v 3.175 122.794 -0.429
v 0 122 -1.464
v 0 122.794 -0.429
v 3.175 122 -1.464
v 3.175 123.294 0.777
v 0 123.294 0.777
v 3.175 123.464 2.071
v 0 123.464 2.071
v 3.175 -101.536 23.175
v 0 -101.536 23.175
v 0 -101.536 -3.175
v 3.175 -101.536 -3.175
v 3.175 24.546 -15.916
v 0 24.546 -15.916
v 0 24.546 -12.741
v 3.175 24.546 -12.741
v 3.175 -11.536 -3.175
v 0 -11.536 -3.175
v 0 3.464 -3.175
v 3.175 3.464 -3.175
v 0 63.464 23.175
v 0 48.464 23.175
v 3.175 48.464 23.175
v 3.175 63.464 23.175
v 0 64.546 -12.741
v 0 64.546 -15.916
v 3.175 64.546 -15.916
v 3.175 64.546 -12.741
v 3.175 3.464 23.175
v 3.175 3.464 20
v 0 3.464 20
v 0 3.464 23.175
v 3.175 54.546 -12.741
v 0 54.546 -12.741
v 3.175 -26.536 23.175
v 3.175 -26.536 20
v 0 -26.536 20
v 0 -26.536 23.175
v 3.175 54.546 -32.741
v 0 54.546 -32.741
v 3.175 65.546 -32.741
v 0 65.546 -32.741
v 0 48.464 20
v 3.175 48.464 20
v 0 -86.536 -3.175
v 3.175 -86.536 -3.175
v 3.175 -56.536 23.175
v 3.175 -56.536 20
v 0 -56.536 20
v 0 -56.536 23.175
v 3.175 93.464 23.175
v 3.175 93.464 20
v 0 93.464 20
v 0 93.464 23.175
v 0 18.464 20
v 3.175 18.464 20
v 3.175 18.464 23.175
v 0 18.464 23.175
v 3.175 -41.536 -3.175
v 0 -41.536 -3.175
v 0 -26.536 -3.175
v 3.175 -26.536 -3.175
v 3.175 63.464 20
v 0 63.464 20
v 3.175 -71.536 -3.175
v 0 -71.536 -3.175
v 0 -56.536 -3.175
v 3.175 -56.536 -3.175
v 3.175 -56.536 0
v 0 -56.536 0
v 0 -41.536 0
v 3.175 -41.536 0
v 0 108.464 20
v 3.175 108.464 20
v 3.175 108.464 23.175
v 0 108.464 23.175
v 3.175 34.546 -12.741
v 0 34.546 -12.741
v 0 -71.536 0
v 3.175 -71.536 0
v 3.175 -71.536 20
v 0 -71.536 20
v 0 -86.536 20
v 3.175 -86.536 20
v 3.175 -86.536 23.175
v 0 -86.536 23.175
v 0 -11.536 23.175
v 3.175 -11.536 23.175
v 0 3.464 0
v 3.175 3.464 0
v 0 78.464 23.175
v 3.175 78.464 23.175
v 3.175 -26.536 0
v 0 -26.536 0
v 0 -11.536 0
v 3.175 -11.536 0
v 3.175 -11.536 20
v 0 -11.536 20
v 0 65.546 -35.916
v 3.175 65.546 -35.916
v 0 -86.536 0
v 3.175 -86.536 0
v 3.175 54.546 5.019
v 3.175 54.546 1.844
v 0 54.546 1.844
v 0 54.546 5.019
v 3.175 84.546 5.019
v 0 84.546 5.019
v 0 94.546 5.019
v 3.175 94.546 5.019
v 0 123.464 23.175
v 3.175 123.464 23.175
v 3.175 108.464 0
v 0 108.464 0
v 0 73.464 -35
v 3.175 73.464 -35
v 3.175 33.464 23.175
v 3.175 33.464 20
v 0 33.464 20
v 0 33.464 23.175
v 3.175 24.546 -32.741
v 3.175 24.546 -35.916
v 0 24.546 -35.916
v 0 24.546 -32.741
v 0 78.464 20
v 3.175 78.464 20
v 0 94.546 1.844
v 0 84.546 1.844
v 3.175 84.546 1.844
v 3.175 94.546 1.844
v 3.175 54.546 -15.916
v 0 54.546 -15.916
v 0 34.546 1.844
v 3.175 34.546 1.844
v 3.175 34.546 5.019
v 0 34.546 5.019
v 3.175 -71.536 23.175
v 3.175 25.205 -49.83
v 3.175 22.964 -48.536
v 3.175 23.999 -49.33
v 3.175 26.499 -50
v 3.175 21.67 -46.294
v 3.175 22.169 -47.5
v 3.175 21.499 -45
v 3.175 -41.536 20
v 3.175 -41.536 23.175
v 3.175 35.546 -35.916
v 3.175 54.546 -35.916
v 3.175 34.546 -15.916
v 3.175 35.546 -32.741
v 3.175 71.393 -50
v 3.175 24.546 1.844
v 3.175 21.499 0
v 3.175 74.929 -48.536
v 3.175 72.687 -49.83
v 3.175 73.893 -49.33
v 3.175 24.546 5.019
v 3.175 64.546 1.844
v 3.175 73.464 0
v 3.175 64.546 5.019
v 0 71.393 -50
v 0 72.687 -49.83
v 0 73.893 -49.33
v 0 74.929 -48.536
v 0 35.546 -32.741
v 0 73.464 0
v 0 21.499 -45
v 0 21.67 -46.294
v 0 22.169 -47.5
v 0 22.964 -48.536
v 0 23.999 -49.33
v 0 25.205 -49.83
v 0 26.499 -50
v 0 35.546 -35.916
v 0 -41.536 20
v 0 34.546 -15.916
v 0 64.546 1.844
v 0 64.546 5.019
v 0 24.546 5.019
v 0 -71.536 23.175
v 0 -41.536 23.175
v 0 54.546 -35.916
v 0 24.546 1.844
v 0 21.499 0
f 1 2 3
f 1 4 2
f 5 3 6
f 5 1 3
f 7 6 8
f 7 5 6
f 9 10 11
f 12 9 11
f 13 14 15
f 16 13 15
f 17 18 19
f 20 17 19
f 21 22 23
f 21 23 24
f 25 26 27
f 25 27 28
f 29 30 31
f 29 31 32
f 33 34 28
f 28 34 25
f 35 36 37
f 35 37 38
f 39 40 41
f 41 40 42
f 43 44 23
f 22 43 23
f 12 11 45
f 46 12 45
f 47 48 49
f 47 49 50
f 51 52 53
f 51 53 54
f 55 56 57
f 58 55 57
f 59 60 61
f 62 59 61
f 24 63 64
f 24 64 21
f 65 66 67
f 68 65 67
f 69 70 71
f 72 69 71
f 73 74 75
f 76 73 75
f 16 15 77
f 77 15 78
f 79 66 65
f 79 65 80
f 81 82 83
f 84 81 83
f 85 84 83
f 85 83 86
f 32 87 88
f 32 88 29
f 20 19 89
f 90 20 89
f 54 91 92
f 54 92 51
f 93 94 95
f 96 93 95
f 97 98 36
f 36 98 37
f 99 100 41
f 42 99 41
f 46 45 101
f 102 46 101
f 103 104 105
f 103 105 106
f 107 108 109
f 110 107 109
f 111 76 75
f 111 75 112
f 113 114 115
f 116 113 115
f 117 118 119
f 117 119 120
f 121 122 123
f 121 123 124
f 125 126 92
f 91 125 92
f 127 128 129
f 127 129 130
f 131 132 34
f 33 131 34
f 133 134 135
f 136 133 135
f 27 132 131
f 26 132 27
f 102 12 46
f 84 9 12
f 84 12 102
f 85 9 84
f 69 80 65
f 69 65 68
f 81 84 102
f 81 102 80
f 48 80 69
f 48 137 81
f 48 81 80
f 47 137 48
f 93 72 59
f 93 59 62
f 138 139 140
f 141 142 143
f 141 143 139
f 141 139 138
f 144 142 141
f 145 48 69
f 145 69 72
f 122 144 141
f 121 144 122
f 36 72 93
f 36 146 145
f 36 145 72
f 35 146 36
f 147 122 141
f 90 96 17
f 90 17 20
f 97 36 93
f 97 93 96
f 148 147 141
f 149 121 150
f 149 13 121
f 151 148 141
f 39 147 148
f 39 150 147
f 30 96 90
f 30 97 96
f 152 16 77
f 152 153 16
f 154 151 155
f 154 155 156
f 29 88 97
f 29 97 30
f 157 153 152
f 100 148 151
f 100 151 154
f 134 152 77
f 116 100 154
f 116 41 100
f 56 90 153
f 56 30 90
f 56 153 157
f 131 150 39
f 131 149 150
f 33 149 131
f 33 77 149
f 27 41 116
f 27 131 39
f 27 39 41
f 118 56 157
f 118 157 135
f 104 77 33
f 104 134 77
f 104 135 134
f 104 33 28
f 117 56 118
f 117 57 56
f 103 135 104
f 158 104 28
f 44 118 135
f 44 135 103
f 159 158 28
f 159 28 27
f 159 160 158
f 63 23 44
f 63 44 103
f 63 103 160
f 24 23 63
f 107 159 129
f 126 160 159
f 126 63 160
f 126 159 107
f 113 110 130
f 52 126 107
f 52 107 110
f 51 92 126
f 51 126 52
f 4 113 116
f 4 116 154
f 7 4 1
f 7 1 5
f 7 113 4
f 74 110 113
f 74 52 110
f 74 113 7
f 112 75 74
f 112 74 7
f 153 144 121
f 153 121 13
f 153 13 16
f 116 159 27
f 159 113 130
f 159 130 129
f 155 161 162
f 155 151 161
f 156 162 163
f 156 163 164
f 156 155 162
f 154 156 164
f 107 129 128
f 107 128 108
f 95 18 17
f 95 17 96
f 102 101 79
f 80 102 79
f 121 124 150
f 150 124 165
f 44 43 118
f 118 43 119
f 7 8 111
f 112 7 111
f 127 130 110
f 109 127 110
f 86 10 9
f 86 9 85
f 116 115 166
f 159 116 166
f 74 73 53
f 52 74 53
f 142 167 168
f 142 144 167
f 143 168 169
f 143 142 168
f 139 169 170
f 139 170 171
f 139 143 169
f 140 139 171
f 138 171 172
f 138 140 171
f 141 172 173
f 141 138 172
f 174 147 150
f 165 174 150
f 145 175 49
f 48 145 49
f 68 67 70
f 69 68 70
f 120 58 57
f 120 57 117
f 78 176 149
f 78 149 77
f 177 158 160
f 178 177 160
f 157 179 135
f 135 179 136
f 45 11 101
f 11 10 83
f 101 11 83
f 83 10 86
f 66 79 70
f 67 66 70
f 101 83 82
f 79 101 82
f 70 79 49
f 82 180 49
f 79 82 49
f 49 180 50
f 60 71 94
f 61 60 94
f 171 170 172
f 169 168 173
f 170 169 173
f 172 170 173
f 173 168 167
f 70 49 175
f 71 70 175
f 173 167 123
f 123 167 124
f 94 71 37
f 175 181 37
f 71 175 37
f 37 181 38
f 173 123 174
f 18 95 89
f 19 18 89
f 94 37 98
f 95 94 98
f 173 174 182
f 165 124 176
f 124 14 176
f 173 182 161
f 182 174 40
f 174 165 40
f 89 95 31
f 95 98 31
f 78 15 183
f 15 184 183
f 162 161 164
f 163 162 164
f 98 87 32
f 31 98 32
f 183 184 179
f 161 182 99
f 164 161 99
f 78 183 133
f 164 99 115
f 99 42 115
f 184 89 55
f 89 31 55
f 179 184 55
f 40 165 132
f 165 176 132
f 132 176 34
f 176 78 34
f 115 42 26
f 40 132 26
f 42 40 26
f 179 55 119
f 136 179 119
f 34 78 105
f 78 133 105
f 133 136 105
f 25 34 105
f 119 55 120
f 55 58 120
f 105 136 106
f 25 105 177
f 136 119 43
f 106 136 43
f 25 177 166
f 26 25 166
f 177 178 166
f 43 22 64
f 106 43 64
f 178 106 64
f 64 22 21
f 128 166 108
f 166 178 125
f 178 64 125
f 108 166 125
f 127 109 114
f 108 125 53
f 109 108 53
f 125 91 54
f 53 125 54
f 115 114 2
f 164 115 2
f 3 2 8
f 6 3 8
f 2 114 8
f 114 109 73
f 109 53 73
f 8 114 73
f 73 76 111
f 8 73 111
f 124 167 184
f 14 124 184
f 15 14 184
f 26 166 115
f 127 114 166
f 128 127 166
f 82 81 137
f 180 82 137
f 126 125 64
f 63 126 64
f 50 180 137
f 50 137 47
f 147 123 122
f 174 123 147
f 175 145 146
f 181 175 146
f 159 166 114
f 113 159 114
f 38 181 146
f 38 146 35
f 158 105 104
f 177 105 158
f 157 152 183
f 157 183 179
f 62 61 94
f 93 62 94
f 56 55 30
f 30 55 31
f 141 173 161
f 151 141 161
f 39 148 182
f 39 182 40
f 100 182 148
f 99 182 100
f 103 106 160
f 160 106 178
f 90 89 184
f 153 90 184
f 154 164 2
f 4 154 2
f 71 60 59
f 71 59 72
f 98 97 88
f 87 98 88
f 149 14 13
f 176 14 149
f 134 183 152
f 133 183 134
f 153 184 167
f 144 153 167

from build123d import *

# Parameters (mm, degrees)
F0_W     = 15
F0_H     = 3.175
F0_W_2   = 10
F0_W_3   = 11
F0_H_2   = 20
F1_DEPTH = 3.175
F2_R     = 5


# Not quite as in the source:
# - a feature names something its author has since deleted; it is built from what else it names


with BuildPart() as f1:
    # F0 (on Right) → F1 (new body)
    with BuildSketch(Plane.YZ):
        with Locations((-94.0358207209, -1.5875)):
            Rectangle(F0_W, F0_H)
        with Locations((-64.0358207209, -1.5875)):
            Rectangle(F0_W, F0_H)
        with Locations((-34.0358207209, -1.5875)):
            Rectangle(F0_W, F0_H)
        with Locations((-4.0358207209, -1.5875)):
            Rectangle(F0_W, F0_H)
        Polygon((-101.5358207209, 20), (-101.5358207209, 0), (-86.5358207209, 0), (-71.5358207209, 0), (-56.5358207209, 0), (-41.5358207209, 0), (-26.5358207209, 0), (-11.5358207209, 0), (3.4641792791, 0), (21.4992204921, 0), (38.0393435029, 0), (73.4641792791, 0), (108.4641792791, 0), (108.4641792791, 20), (93.4641792791, 20), (78.4641792791, 20), (63.4641792791, 20), (48.4641792791, 20), (33.4641792791, 20), (18.4641792791, 20), (3.4641792791, 20), (-11.5358207209, 20), (-26.5358207209, 20), (-41.5358207209, 20), (-56.5358207209, 20), (-71.5358207209, 20), (-86.5358207209, 20), align=None)
        with Locations((29.5455027372, 3.4310361944)):
            Rectangle(F0_W_2, F0_H, mode=Mode.SUBTRACT)
        with Locations((59.5455027372, 3.4310361944)):
            Rectangle(F0_W_2, F0_H, mode=Mode.SUBTRACT)
        with Locations((89.5455027372, 3.4310361944)):
            Rectangle(F0_W_2, F0_H, mode=Mode.SUBTRACT)
        Polygon((38.0393435029, 0), (21.4992204921, 0), (21.4992204921, -50), (73.4641792791, -50), (73.4641792791, -35), (73.4641792791, 0), align=None)
        with Locations((30.0455027372, -34.3287487835)):
            Rectangle(F0_W_3, F0_H, mode=Mode.SUBTRACT)
        with Locations((60.0455027372, -34.3287487835)):
            Rectangle(F0_W_3, F0_H, mode=Mode.SUBTRACT)
        with Locations((29.5455027372, -14.3287487835)):
            Rectangle(F0_W_2, F0_H, mode=Mode.SUBTRACT)
        with Locations((59.5455027372, -14.3287487835)):
            Rectangle(F0_W_2, F0_H, mode=Mode.SUBTRACT)
        with Locations((-94.0358207209, 21.5875)):
            Rectangle(F0_W, F0_H)
        with Locations((-64.0358207209, 21.5875)):
            Rectangle(F0_W, F0_H)
        with Locations((-34.0358207209, 21.5875)):
            Rectangle(F0_W, F0_H)
        with Locations((-4.0358207209, 21.5875)):
            Rectangle(F0_W, F0_H)
        with Locations((25.9641792791, 21.5875)):
            Rectangle(F0_W, F0_H)
        with Locations((55.9641792791, 21.5875)):
            Rectangle(F0_W, F0_H)
        with Locations((85.9641792791, 21.5875)):
            Rectangle(F0_W, F0_H)
        with Locations((115.9641792791, 21.5875)):
            Rectangle(F0_W, F0_H)
        with Locations((115.9641792791, 10)):
            Rectangle(F0_W, F0_H_2)
        Polygon((73.4641792791, -35), (73.4641792791, -50), (123.4641792791, 0), (108.4641792791, 0), align=None)
    extrude(amount=F1_DEPTH)

    # F2
    f2_edges = [f1.edges().sort_by_distance(p)[0] for p in [
        (1.5875, 123.464179, 0),
        (1.5875, 73.464179, -50),
        (1.5875, 21.49922, -50),
    ]]
    fillet(f2_edges, radius=F2_R)


solid = f1.part
